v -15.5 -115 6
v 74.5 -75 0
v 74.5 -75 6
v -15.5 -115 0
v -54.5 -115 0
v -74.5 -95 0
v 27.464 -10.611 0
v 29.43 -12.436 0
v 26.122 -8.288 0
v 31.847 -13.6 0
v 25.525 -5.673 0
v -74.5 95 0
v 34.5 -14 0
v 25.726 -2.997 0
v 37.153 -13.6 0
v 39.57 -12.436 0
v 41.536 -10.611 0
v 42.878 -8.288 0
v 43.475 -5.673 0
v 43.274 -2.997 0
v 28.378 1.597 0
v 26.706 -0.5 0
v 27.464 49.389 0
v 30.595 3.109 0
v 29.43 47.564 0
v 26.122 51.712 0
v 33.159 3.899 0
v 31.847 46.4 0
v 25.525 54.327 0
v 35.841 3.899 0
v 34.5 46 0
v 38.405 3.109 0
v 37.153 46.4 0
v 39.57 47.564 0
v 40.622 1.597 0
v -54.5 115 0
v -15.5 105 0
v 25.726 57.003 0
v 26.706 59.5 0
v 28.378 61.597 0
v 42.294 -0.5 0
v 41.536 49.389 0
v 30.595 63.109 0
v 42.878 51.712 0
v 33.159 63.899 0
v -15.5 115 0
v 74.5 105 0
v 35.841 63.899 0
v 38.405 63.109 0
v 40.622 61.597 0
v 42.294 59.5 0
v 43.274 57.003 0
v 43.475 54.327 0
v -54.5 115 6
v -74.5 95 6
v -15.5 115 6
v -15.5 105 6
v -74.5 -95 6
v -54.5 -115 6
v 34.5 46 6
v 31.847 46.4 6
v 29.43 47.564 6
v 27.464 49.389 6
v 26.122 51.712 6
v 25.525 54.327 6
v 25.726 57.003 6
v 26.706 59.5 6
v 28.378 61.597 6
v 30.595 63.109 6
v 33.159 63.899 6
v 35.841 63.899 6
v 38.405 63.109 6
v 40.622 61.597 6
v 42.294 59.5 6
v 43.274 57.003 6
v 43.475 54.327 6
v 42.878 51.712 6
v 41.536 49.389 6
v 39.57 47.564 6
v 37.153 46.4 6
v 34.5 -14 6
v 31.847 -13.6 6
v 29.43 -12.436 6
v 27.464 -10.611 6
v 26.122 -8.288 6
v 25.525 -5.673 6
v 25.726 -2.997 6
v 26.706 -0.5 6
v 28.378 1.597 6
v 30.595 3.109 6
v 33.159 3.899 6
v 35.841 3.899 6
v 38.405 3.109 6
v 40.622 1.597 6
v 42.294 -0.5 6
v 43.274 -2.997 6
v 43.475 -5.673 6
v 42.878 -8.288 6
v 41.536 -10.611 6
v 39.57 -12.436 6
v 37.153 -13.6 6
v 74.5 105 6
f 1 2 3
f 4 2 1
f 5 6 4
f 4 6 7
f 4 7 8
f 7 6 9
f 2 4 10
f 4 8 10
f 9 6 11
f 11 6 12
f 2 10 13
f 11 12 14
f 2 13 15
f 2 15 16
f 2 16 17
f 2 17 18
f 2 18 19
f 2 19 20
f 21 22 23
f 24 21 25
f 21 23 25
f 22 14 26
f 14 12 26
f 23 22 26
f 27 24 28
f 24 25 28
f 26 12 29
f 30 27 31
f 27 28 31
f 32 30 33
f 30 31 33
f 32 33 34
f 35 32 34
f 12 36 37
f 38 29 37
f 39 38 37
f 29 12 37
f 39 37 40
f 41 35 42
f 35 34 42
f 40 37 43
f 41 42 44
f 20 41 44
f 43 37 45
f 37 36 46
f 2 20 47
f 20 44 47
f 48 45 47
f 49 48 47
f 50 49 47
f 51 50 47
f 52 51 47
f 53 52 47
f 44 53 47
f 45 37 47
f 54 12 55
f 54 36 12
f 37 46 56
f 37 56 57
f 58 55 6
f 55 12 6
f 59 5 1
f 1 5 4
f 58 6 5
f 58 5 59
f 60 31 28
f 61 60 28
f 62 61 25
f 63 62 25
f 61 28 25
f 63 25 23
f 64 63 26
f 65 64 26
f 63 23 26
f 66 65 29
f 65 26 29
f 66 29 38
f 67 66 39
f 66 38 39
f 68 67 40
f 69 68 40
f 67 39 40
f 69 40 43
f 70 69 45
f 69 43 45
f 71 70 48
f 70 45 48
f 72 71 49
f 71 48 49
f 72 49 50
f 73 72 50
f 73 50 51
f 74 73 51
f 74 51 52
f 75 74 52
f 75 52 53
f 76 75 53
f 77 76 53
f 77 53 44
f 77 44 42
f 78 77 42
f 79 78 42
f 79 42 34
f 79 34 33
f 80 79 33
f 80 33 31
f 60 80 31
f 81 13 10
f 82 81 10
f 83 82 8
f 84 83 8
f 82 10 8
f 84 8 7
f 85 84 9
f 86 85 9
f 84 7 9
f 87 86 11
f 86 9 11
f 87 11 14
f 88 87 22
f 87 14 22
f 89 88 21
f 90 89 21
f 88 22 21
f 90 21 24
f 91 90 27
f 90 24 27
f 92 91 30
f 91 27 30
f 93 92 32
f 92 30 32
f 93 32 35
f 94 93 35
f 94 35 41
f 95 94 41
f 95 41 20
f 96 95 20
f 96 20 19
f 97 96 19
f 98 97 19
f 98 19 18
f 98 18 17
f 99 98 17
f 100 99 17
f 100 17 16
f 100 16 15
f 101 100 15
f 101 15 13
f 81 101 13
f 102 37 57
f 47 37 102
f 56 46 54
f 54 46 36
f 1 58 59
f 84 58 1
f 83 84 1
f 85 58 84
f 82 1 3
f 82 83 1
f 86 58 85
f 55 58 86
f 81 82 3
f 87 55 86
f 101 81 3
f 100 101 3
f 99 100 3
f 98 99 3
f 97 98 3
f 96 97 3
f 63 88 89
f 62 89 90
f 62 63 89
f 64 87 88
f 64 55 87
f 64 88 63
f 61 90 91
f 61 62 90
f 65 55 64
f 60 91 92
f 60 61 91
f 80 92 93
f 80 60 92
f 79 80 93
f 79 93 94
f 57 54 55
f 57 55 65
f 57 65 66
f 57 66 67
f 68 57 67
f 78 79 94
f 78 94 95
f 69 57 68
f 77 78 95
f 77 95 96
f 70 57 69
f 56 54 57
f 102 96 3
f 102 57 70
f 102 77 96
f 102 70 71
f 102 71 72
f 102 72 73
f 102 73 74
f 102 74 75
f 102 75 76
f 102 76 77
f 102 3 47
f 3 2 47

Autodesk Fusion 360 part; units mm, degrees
sketch "スケッチ1" plane through (0, 0, 0) normal (0, 0, 1) x (1, 0, 0)
  line L0 (-15.5, 115) -> (-74.5, 115)
  line L1 (-74.5, 115) -> (-74.5, -115)
  line L2 (-74.5, -115) -> (-15.5, -115)
  line L3 (74.5, -75) -> (74.5, 105)
  line L4 (68.0217, 105) -> (-74.5, -115) construction
  line L5 (-74.5, 115) -> (54.38, -83.9422) construction
  line L6 (-15.5, 115) -> (-15.5, 105)
  line L7 (-15.5, 105) -> (74.5, 105)
  line L8 (-74.5, -115) -> (-15.5, -115) construction
  line L9 (74.5, -75) -> (-15.5, -115)
  dimension "d2" = 230
  dimension "d5" = 59
extrude "押し出し1" add sketch "スケッチ1" along normal blind 6
chamfer "面取り1" distance 20 angle 45 2 edges at (-74.5, -115, 3) (-74.5, 115, 3)
sketch "スケッチ2" plane through (0, 0, 6) normal (0, 0, 1) x (-1, 0, 0)
  line L0 (54.5, -115) -> (74.5, -95)
  line L1 (74.5, -95) -> (74.5, 95)
  line L2 (74.5, 95) -> (54.5, 115)
  line L3 (54.5, 115) -> (15.5, 115)
  line L4 (15.5, 115) -> (-74.5, 75)
  line L5 (-74.5, 75) -> (-74.5, -105)
  line L6 (-74.5, -105) -> (15.5, -105)
  line L7 (15.5, -105) -> (15.5, -115)
  line L8 (15.5, -115) -> (54.5, -115)
  line L9 (-74.5, -105) -> (-34.5, -105) construction
  line L10 (-34.5, -105) -> (-34.5, -55) construction
  line L11 (-34.5, -55) -> (-74.5, -55) construction
  line L12 (-74.5, -55) -> (-74.5, -105) construction
  line L13 (-34.5, -55) -> (-34.5, 5) construction
  point P0 (-34.5, -55)
  point P1 (-34.5, 5)
  dimension "d10" = 40
  dimension "d11" = 50
  dimension "d12" = 60
hole "穴1" at (34.5, 55, 6) at (34.5, -5, 6) direction (0, 0, -1) diameter 18 end through all
equation "d5 = 20 mm + 39 mm"
